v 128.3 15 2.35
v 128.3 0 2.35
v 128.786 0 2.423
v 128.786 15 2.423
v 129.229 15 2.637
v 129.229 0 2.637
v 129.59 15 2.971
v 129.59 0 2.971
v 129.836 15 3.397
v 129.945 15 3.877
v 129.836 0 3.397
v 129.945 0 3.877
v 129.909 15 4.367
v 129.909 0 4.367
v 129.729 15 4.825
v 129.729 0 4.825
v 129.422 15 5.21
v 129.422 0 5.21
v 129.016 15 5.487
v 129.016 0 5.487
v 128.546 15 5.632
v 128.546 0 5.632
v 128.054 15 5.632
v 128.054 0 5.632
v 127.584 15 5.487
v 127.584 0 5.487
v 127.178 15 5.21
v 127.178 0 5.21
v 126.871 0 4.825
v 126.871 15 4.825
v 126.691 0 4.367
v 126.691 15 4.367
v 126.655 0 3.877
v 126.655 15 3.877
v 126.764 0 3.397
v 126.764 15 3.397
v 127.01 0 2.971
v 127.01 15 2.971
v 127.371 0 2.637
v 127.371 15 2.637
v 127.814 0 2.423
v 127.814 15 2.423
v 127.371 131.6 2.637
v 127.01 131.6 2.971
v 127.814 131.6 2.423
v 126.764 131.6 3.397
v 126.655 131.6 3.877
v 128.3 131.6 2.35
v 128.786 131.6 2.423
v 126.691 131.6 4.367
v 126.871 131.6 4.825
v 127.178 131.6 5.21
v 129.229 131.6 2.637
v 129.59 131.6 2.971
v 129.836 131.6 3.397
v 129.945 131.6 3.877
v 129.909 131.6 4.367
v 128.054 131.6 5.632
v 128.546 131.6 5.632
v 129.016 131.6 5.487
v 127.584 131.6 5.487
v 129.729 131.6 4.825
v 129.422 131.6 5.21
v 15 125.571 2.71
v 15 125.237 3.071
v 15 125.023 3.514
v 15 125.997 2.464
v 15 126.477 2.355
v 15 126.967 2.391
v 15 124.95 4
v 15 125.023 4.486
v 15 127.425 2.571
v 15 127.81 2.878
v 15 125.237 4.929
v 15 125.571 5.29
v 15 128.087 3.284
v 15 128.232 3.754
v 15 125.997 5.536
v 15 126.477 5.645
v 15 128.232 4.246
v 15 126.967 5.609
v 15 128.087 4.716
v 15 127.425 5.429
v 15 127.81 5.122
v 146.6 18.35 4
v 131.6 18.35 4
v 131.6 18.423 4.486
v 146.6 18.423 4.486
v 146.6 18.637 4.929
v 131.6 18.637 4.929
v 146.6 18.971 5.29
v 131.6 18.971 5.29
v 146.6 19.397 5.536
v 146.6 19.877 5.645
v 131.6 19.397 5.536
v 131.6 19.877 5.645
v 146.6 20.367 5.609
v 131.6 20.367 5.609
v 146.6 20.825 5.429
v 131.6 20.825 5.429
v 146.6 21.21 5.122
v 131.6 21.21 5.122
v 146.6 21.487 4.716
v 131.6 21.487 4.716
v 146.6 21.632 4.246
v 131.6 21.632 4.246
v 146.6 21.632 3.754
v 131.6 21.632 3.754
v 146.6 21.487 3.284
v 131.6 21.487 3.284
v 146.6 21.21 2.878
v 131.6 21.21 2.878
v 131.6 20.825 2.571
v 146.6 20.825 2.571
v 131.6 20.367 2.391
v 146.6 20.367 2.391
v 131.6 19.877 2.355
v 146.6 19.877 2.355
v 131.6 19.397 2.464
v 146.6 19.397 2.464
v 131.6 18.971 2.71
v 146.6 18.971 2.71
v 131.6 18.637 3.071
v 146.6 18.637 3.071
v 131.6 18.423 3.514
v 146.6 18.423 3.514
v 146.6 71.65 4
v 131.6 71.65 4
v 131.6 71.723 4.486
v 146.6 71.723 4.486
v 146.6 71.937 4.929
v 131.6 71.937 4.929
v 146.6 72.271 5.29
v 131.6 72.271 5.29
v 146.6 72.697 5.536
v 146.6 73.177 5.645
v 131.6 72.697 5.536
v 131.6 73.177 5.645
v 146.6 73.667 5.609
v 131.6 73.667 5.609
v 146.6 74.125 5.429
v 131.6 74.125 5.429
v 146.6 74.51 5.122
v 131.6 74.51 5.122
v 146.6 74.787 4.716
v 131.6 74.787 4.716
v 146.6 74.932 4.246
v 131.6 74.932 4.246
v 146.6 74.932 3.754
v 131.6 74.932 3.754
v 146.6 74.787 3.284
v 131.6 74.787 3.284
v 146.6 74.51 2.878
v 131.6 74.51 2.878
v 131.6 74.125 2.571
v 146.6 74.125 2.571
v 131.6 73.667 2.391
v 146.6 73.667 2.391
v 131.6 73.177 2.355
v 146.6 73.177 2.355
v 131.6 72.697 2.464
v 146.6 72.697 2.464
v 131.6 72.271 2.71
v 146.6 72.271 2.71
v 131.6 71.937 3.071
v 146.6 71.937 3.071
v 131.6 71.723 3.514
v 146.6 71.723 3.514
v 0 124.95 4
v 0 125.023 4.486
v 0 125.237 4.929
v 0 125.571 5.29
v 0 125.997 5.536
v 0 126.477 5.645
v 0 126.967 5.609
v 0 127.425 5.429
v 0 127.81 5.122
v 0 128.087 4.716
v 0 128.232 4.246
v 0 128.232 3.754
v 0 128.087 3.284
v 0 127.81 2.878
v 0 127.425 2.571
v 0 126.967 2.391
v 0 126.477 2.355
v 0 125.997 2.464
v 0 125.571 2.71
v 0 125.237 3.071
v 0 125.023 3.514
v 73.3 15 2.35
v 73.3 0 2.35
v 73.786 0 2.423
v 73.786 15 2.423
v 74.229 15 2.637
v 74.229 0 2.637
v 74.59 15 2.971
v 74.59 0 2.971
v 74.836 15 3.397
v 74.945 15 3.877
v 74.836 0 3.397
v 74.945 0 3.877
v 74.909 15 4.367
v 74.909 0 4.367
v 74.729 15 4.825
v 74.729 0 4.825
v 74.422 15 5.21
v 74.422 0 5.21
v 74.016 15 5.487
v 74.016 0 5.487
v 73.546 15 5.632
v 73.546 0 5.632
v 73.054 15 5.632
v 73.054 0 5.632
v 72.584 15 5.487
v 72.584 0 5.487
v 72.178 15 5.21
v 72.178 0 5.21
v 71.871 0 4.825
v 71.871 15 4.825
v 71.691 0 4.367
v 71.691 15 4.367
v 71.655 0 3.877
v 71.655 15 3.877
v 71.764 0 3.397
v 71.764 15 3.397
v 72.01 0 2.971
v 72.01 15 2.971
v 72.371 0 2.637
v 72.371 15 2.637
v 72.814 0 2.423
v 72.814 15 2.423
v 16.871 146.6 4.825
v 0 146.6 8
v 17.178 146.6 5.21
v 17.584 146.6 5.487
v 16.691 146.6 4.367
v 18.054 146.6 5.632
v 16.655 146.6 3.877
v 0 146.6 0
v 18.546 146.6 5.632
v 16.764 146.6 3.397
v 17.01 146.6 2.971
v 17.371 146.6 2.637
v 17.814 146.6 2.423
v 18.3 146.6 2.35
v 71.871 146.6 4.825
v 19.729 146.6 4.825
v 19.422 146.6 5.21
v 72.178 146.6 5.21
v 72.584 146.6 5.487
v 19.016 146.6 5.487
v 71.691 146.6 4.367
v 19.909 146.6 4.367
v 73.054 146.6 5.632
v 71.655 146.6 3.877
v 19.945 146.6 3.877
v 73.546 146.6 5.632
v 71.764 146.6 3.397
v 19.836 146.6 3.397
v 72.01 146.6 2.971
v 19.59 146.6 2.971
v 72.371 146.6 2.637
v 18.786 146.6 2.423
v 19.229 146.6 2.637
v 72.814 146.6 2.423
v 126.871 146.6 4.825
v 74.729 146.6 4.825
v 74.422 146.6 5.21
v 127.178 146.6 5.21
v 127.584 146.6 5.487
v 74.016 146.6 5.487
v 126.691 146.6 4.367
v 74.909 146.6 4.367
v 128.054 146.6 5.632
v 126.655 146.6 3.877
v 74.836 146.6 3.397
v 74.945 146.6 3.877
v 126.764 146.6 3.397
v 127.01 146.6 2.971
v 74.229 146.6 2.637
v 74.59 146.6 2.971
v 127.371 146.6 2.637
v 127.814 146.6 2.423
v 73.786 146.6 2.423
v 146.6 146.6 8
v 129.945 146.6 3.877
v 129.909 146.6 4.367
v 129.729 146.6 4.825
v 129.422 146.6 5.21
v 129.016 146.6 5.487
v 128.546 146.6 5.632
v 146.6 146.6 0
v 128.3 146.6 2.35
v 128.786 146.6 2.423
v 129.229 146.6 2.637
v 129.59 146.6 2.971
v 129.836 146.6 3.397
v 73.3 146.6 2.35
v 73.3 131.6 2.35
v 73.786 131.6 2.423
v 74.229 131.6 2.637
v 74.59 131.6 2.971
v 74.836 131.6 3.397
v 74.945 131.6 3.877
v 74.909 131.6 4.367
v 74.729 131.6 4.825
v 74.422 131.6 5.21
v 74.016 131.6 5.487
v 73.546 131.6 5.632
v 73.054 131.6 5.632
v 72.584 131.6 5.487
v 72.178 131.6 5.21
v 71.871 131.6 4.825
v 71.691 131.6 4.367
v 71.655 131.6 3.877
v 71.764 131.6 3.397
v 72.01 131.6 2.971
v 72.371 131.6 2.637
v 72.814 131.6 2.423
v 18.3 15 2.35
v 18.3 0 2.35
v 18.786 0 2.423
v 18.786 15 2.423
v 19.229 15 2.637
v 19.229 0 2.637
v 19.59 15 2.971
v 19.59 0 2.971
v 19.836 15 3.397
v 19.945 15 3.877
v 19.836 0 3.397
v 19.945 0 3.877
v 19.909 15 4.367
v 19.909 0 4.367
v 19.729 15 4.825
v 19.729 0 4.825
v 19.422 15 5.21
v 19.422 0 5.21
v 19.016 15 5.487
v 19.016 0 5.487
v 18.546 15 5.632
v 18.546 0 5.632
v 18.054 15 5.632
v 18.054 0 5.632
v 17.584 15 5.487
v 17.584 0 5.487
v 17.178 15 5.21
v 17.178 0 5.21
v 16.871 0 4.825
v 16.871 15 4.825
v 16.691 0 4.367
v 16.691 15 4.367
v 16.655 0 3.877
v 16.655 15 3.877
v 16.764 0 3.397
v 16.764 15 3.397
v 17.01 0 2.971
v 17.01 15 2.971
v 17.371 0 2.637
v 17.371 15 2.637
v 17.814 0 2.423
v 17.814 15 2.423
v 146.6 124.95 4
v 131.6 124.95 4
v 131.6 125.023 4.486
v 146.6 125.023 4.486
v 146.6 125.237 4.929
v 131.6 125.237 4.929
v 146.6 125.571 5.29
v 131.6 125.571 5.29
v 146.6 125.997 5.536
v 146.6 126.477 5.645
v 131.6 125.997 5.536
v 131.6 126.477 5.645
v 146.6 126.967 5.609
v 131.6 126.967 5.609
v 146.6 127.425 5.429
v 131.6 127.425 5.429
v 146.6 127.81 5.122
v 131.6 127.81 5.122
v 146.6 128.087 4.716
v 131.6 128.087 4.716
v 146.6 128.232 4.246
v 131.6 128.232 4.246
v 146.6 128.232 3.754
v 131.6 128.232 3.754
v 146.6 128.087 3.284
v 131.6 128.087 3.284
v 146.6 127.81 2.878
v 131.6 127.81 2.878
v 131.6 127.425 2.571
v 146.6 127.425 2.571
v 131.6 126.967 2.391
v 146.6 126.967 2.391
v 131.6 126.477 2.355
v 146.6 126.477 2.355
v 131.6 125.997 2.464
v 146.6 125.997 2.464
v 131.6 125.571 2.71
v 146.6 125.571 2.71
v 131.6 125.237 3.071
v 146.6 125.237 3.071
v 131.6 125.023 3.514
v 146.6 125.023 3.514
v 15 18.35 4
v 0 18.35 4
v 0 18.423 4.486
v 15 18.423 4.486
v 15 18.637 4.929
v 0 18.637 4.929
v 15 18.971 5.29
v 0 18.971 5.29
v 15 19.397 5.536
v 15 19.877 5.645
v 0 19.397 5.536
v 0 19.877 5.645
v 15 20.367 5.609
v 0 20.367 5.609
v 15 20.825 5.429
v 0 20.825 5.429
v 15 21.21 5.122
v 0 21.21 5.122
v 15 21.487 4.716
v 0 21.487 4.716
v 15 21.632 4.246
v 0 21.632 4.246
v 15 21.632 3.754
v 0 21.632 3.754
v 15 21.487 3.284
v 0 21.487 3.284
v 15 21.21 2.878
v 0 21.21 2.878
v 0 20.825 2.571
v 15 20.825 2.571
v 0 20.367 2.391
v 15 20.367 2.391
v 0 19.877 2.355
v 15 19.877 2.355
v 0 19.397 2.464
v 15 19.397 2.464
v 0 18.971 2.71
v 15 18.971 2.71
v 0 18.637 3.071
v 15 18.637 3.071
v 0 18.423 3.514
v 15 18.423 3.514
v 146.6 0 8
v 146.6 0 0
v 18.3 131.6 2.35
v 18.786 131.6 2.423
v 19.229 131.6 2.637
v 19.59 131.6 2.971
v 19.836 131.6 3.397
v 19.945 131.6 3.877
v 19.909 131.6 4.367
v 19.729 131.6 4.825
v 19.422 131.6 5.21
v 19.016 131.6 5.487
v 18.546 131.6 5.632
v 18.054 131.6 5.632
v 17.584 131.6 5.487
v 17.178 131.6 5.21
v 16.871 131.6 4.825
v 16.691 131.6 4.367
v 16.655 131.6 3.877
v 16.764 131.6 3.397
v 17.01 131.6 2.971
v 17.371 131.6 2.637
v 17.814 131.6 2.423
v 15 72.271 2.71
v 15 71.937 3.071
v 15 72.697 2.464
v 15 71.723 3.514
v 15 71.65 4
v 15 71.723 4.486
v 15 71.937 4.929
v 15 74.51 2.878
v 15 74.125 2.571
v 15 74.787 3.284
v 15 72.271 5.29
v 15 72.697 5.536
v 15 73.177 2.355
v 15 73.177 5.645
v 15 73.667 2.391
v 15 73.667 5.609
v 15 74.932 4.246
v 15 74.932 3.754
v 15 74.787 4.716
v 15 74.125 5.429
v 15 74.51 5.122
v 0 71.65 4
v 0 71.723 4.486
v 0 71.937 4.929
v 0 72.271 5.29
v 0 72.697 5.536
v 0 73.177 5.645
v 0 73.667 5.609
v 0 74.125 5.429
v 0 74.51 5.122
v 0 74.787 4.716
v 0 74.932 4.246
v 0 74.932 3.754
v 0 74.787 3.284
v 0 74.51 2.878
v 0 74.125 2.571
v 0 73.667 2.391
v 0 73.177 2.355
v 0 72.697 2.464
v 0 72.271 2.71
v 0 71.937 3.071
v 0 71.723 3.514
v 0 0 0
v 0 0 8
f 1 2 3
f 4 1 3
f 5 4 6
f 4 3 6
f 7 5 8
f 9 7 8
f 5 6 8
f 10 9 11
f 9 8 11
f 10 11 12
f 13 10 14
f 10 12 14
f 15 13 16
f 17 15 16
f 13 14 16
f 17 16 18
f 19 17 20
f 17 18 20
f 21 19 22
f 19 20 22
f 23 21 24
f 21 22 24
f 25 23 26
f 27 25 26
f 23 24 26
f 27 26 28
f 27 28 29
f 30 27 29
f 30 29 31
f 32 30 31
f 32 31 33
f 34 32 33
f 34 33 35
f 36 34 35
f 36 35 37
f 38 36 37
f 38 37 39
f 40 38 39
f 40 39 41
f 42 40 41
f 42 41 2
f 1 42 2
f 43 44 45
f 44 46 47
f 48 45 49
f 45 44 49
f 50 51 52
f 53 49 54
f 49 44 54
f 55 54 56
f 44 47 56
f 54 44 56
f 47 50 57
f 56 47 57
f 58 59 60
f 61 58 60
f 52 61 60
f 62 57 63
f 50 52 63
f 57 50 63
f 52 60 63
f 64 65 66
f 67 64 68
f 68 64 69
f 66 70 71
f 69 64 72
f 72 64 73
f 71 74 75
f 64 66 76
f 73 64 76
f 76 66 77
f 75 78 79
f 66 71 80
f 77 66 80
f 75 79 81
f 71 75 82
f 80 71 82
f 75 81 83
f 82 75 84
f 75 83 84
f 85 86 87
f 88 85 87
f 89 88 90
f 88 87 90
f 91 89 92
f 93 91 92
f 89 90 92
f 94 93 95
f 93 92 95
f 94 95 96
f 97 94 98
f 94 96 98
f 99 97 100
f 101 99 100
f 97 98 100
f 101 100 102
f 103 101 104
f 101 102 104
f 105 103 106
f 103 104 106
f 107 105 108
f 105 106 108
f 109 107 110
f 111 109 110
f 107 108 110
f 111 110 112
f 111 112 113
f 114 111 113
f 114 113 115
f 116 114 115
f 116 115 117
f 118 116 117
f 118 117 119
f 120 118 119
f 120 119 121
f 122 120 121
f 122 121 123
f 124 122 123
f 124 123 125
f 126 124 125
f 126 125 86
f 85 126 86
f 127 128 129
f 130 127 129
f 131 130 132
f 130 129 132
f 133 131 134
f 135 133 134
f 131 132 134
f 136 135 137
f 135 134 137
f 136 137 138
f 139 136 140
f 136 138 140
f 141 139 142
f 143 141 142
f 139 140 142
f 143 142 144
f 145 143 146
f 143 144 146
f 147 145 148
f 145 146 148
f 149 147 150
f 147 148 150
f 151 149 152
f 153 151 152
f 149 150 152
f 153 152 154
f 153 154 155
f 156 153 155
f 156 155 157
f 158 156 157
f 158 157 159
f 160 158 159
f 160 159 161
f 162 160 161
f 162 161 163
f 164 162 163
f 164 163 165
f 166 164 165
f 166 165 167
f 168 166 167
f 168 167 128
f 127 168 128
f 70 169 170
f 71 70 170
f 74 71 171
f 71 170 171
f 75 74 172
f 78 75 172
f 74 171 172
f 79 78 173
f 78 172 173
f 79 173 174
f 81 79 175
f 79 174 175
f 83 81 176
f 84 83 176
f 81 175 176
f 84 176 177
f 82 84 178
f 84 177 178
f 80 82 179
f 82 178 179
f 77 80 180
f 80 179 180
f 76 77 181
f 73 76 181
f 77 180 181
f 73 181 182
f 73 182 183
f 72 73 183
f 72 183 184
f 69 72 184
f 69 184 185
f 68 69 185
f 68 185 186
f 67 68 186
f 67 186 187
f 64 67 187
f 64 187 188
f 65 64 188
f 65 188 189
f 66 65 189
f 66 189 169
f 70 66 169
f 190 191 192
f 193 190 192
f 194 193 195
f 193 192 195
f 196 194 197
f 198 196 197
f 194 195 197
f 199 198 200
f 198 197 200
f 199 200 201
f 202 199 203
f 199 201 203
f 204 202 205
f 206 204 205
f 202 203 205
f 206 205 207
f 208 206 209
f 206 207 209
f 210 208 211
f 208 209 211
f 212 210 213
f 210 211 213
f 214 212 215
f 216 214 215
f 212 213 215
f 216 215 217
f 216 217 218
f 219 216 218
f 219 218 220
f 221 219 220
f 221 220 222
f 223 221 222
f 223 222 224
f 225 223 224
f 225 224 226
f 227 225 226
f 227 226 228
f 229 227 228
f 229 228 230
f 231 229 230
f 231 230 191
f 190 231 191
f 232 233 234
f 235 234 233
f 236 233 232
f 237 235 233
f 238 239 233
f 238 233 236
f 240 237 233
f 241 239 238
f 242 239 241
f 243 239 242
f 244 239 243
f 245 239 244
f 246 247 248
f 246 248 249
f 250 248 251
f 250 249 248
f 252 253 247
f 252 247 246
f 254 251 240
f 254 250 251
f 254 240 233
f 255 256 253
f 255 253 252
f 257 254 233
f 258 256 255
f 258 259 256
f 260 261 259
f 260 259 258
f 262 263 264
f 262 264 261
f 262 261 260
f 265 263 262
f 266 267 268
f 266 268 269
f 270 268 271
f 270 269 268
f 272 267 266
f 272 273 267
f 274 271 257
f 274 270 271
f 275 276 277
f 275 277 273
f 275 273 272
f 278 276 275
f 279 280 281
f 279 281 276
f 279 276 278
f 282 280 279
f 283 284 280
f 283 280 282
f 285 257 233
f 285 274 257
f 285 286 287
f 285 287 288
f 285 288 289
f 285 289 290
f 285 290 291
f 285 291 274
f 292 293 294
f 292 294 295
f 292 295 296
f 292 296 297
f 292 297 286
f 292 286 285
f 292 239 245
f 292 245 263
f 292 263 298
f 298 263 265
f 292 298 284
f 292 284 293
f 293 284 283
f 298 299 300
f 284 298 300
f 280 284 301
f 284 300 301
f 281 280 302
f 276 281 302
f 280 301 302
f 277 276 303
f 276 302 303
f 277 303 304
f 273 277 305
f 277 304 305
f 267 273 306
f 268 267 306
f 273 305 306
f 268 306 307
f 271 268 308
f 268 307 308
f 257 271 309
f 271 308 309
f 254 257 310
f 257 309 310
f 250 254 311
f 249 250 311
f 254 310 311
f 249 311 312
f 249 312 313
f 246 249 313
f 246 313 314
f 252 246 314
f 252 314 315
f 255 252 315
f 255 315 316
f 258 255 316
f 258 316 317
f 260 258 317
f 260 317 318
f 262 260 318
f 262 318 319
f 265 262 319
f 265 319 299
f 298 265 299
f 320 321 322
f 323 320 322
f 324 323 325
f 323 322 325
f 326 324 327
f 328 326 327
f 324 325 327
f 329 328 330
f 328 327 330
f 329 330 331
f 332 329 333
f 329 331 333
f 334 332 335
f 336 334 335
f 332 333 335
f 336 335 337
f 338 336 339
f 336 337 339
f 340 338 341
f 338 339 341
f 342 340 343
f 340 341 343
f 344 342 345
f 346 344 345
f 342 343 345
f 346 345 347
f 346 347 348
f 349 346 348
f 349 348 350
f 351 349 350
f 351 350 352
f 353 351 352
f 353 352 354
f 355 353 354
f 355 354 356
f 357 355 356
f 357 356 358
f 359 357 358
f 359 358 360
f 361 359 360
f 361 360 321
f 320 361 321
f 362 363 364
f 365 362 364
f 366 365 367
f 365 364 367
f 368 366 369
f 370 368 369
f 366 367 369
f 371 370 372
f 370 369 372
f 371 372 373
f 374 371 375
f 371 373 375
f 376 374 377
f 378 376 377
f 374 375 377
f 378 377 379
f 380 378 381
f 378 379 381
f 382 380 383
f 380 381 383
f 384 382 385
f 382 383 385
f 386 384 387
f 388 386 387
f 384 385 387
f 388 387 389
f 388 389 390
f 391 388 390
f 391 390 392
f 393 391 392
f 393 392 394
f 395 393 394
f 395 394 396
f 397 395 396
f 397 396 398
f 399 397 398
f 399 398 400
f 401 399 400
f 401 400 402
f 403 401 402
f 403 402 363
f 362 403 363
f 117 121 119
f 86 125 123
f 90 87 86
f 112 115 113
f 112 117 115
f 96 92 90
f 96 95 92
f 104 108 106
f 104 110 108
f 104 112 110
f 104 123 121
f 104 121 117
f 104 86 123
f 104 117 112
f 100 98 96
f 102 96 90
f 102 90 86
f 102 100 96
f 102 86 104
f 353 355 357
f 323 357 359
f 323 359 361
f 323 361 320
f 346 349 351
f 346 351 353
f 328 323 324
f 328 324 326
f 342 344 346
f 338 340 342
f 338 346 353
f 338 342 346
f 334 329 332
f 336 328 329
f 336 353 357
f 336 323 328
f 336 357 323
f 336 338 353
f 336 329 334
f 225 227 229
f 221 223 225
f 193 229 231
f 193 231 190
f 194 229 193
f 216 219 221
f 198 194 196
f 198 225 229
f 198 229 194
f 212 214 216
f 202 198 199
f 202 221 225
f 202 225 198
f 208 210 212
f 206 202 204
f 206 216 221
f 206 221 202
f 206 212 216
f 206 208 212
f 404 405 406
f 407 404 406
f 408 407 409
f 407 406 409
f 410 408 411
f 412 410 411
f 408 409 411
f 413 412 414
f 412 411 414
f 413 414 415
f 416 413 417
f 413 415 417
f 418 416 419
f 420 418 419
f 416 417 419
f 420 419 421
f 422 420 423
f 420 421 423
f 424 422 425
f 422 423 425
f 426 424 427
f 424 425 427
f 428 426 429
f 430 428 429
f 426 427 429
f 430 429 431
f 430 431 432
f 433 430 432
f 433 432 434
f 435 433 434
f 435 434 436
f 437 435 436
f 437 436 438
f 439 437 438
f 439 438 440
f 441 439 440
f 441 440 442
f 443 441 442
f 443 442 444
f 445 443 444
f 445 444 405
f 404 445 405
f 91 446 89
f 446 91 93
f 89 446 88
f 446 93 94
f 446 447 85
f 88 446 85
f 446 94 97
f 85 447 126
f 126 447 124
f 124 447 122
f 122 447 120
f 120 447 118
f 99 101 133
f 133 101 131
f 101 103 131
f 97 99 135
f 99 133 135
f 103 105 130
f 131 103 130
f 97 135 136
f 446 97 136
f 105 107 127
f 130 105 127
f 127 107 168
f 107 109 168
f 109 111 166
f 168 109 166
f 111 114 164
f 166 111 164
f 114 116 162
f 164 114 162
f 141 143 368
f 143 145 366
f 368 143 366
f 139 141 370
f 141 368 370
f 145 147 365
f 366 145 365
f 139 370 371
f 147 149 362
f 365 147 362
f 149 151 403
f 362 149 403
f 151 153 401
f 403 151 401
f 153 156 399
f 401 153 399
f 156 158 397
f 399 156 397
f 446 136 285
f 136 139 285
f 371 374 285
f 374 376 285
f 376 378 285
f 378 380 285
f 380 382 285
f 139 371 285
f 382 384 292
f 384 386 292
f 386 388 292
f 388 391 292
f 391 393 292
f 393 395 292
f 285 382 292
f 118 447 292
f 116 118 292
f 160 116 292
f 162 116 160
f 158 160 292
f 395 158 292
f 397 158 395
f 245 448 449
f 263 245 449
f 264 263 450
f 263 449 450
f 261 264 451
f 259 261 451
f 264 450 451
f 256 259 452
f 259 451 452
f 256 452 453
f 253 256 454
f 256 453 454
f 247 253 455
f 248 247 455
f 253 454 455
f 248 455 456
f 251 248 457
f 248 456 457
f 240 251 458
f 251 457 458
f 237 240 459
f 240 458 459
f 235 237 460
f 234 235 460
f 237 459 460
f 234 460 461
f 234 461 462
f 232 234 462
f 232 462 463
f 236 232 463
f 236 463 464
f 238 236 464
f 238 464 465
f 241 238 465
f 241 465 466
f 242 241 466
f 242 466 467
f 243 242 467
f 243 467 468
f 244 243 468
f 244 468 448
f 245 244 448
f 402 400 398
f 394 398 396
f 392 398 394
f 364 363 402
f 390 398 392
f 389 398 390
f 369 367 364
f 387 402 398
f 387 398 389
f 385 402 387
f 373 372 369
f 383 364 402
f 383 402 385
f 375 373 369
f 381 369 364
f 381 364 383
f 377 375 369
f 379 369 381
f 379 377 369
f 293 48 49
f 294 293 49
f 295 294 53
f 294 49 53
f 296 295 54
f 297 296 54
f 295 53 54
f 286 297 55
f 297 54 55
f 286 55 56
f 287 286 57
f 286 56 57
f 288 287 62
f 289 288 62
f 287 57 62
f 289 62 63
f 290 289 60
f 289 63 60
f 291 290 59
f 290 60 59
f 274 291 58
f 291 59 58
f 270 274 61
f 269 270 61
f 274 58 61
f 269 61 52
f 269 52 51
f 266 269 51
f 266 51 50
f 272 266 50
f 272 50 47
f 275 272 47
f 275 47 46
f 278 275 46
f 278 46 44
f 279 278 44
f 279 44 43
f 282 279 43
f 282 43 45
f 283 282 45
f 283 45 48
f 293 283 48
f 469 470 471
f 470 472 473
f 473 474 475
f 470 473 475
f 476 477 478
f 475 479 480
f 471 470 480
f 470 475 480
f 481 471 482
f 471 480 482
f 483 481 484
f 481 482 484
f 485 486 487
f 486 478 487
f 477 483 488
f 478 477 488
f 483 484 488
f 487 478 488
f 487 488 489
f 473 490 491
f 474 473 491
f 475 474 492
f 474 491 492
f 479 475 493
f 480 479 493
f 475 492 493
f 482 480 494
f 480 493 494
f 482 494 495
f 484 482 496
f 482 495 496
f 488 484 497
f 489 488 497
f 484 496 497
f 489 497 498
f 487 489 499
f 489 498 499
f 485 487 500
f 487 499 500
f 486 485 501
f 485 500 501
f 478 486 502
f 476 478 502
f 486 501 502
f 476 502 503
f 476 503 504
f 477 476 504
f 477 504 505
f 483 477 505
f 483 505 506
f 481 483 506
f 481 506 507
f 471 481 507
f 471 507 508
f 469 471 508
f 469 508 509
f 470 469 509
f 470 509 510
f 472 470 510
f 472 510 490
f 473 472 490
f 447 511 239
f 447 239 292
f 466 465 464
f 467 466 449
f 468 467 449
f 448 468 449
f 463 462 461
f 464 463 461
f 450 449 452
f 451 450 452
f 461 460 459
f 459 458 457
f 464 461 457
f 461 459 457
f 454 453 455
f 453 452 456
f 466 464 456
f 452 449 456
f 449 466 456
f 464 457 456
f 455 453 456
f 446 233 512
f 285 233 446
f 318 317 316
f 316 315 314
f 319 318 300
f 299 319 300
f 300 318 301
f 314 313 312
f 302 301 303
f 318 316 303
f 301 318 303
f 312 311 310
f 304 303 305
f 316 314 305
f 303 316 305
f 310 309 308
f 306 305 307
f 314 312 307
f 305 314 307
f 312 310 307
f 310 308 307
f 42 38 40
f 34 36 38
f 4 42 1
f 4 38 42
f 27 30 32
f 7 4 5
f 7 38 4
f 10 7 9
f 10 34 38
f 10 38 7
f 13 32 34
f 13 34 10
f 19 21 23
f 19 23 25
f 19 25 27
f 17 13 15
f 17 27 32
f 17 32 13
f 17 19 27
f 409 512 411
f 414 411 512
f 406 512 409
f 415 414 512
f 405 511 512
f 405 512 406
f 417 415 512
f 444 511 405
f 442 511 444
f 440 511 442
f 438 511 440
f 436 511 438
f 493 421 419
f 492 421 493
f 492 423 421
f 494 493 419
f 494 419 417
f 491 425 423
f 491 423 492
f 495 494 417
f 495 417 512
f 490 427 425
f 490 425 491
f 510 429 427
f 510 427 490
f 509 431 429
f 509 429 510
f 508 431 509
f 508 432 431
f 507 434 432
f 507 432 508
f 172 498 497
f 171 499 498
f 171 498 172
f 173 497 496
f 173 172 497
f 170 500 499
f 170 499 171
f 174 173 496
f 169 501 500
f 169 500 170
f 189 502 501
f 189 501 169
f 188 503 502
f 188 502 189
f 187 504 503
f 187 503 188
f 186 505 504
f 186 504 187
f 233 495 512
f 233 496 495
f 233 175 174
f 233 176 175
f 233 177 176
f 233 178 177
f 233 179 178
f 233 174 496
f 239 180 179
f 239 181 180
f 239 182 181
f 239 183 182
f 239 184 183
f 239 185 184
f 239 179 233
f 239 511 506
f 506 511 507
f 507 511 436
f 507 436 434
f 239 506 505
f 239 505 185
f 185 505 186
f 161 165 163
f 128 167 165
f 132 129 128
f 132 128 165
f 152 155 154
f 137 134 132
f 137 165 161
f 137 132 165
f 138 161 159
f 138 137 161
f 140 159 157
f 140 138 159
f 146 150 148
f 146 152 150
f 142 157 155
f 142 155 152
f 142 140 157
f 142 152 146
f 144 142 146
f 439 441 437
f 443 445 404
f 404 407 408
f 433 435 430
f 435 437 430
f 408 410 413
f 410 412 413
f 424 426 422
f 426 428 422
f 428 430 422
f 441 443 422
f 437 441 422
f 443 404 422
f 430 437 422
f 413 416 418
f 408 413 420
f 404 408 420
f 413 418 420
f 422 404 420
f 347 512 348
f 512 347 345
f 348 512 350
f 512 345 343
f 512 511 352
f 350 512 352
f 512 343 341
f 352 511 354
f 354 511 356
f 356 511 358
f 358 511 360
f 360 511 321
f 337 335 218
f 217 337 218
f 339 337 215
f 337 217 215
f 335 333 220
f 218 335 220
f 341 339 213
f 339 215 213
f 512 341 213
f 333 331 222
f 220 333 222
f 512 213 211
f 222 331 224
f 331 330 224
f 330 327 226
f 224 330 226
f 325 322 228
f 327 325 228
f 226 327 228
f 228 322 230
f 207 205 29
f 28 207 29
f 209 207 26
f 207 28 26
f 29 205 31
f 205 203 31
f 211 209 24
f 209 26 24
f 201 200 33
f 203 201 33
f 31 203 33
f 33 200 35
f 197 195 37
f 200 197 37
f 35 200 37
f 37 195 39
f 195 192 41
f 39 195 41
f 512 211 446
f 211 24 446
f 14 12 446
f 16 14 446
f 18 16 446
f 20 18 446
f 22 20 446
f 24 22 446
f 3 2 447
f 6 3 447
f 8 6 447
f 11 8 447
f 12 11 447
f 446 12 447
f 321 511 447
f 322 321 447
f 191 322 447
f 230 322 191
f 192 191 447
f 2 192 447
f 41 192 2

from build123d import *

# Parameters (mm, degrees)
SKETCH_1_W          = 146.6
SKETCH_1_H          = 146.6
EXTRUDE_1_DEPTH     = 8
SKETCH_2_R          = 1.65
CUT_EXTRUDE_1_DEPTH = 208.477998834
SKETCH_3_R          = 1.65
CUT_EXTRUDE_2_DEPTH = 208.477998834
EXTRUDE_2_REACH     = 209.478
SKETCH_4_W          = 116.6
SKETCH_4_H          = 116.6


with BuildPart() as part:
    # Эскиз1 → Бобышка-Вытянуть1 (new body)
    with BuildSketch(Plane.XY):
        with Locations((73.3, 73.3)):
            Rectangle(SKETCH_1_W, SKETCH_1_H)
    extrude(amount=EXTRUDE_1_DEPTH)

    # Эскиз2 → Вырез-Вытянуть1 (cut, through all)
    with BuildSketch(Plane.XZ):
        with Locations(Location((18.3, 4, 0), (0, 0, 270))):
            Circle(SKETCH_2_R)
        with Locations(Location((73.3, 4, 0), (0, 0, 270))):
            Circle(SKETCH_2_R)
        with Locations(Location((128.3, 4, 0), (0, 0, 270))):
            Circle(SKETCH_2_R)
    extrude(amount=-CUT_EXTRUDE_1_DEPTH, mode=Mode.SUBTRACT)

    # Эскиз3 → Вырез-Вытянуть2 (cut, through all)
    with BuildSketch(Plane.ZY):
        with Locations(Location((4, 20, 0), (0, 0, 270))):
            Circle(SKETCH_3_R)
        with Locations(Location((4, 73.3, 0), (0, 0, 270))):
            Circle(SKETCH_3_R)
        with Locations(Location((4, 126.6, 0), (0, 0, 270))):
            Circle(SKETCH_3_R)
    extrude(amount=-CUT_EXTRUDE_2_DEPTH, mode=Mode.SUBTRACT)

    # Бобышка-Вытянуть2: up to this face of the body (flat: up to its plane)
    extrude_2_end = Plane(part.part.faces().sort_by_distance((73.3, 73.3, 0))[0])
    # Эскиз4 → Бобышка-Вытянуть2 (add, up to the picked face)
    with BuildSketch(Plane.XY.offset(8), mode=Mode.PRIVATE) as extrude_2_sk1:
        with Locations((73.3, 73.3)):
            Rectangle(SKETCH_4_W, SKETCH_4_H)
    extrude_2_tool1 = split(extrude(extrude_2_sk1.sketch, amount=-EXTRUDE_2_REACH, mode=Mode.PRIVATE), bisect_by=extrude_2_end, keep=Keep.BOTH, mode=Mode.PRIVATE)
    add(extrude_2_tool1.solids().sort_by(Axis((73.3, 73.3, 8), (0, 0, -1)))[0])


solid = part.part
